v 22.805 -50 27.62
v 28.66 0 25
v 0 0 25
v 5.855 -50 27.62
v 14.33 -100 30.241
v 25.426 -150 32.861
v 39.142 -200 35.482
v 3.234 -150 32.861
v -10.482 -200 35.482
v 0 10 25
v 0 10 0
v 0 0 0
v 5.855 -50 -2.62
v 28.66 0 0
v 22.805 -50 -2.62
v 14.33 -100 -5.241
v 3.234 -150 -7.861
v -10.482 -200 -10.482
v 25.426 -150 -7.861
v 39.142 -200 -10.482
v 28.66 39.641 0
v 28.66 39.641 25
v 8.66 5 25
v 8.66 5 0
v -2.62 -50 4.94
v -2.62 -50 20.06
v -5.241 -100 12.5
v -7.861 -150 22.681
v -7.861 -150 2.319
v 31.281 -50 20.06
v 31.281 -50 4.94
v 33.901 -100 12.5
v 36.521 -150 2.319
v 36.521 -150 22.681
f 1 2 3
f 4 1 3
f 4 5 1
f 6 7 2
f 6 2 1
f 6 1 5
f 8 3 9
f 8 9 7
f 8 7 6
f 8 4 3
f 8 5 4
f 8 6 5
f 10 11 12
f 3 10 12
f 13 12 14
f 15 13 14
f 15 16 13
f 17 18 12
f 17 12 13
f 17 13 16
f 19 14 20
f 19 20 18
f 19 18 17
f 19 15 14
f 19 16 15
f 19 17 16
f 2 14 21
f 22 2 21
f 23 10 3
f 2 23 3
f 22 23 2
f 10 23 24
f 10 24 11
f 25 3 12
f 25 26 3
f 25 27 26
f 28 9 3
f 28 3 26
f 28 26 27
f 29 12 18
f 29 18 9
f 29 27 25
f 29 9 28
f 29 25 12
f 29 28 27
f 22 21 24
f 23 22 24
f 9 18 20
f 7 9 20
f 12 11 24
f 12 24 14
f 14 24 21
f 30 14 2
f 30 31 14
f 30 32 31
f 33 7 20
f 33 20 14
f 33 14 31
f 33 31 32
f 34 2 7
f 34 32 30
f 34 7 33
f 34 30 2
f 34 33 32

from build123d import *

# Parameters (mm, degrees)
F1_DEPTH = 25
F2_W     = 28.6602540378
F2_H     = 25
F3_DEPTH = 200
F3_TAPER = -3


with BuildPart() as f1:
    # F0 (on Top) → F1 (new body)
    with BuildSketch(Plane.XY):
        Polygon((0, 10), (0, 0), (28.6602540378, 0), (28.6602540378, 39.6410161514), (8.6602540378, 5), align=None)
    extrude(amount=F1_DEPTH)

    # F2 (on face) → F3 (join)
    with BuildSketch(Plane.XZ):
        with Locations((14.3301270189, 12.5)):
            Rectangle(F2_W, F2_H)
    extrude(amount=F3_DEPTH, taper=F3_TAPER)


solid = f1.part
